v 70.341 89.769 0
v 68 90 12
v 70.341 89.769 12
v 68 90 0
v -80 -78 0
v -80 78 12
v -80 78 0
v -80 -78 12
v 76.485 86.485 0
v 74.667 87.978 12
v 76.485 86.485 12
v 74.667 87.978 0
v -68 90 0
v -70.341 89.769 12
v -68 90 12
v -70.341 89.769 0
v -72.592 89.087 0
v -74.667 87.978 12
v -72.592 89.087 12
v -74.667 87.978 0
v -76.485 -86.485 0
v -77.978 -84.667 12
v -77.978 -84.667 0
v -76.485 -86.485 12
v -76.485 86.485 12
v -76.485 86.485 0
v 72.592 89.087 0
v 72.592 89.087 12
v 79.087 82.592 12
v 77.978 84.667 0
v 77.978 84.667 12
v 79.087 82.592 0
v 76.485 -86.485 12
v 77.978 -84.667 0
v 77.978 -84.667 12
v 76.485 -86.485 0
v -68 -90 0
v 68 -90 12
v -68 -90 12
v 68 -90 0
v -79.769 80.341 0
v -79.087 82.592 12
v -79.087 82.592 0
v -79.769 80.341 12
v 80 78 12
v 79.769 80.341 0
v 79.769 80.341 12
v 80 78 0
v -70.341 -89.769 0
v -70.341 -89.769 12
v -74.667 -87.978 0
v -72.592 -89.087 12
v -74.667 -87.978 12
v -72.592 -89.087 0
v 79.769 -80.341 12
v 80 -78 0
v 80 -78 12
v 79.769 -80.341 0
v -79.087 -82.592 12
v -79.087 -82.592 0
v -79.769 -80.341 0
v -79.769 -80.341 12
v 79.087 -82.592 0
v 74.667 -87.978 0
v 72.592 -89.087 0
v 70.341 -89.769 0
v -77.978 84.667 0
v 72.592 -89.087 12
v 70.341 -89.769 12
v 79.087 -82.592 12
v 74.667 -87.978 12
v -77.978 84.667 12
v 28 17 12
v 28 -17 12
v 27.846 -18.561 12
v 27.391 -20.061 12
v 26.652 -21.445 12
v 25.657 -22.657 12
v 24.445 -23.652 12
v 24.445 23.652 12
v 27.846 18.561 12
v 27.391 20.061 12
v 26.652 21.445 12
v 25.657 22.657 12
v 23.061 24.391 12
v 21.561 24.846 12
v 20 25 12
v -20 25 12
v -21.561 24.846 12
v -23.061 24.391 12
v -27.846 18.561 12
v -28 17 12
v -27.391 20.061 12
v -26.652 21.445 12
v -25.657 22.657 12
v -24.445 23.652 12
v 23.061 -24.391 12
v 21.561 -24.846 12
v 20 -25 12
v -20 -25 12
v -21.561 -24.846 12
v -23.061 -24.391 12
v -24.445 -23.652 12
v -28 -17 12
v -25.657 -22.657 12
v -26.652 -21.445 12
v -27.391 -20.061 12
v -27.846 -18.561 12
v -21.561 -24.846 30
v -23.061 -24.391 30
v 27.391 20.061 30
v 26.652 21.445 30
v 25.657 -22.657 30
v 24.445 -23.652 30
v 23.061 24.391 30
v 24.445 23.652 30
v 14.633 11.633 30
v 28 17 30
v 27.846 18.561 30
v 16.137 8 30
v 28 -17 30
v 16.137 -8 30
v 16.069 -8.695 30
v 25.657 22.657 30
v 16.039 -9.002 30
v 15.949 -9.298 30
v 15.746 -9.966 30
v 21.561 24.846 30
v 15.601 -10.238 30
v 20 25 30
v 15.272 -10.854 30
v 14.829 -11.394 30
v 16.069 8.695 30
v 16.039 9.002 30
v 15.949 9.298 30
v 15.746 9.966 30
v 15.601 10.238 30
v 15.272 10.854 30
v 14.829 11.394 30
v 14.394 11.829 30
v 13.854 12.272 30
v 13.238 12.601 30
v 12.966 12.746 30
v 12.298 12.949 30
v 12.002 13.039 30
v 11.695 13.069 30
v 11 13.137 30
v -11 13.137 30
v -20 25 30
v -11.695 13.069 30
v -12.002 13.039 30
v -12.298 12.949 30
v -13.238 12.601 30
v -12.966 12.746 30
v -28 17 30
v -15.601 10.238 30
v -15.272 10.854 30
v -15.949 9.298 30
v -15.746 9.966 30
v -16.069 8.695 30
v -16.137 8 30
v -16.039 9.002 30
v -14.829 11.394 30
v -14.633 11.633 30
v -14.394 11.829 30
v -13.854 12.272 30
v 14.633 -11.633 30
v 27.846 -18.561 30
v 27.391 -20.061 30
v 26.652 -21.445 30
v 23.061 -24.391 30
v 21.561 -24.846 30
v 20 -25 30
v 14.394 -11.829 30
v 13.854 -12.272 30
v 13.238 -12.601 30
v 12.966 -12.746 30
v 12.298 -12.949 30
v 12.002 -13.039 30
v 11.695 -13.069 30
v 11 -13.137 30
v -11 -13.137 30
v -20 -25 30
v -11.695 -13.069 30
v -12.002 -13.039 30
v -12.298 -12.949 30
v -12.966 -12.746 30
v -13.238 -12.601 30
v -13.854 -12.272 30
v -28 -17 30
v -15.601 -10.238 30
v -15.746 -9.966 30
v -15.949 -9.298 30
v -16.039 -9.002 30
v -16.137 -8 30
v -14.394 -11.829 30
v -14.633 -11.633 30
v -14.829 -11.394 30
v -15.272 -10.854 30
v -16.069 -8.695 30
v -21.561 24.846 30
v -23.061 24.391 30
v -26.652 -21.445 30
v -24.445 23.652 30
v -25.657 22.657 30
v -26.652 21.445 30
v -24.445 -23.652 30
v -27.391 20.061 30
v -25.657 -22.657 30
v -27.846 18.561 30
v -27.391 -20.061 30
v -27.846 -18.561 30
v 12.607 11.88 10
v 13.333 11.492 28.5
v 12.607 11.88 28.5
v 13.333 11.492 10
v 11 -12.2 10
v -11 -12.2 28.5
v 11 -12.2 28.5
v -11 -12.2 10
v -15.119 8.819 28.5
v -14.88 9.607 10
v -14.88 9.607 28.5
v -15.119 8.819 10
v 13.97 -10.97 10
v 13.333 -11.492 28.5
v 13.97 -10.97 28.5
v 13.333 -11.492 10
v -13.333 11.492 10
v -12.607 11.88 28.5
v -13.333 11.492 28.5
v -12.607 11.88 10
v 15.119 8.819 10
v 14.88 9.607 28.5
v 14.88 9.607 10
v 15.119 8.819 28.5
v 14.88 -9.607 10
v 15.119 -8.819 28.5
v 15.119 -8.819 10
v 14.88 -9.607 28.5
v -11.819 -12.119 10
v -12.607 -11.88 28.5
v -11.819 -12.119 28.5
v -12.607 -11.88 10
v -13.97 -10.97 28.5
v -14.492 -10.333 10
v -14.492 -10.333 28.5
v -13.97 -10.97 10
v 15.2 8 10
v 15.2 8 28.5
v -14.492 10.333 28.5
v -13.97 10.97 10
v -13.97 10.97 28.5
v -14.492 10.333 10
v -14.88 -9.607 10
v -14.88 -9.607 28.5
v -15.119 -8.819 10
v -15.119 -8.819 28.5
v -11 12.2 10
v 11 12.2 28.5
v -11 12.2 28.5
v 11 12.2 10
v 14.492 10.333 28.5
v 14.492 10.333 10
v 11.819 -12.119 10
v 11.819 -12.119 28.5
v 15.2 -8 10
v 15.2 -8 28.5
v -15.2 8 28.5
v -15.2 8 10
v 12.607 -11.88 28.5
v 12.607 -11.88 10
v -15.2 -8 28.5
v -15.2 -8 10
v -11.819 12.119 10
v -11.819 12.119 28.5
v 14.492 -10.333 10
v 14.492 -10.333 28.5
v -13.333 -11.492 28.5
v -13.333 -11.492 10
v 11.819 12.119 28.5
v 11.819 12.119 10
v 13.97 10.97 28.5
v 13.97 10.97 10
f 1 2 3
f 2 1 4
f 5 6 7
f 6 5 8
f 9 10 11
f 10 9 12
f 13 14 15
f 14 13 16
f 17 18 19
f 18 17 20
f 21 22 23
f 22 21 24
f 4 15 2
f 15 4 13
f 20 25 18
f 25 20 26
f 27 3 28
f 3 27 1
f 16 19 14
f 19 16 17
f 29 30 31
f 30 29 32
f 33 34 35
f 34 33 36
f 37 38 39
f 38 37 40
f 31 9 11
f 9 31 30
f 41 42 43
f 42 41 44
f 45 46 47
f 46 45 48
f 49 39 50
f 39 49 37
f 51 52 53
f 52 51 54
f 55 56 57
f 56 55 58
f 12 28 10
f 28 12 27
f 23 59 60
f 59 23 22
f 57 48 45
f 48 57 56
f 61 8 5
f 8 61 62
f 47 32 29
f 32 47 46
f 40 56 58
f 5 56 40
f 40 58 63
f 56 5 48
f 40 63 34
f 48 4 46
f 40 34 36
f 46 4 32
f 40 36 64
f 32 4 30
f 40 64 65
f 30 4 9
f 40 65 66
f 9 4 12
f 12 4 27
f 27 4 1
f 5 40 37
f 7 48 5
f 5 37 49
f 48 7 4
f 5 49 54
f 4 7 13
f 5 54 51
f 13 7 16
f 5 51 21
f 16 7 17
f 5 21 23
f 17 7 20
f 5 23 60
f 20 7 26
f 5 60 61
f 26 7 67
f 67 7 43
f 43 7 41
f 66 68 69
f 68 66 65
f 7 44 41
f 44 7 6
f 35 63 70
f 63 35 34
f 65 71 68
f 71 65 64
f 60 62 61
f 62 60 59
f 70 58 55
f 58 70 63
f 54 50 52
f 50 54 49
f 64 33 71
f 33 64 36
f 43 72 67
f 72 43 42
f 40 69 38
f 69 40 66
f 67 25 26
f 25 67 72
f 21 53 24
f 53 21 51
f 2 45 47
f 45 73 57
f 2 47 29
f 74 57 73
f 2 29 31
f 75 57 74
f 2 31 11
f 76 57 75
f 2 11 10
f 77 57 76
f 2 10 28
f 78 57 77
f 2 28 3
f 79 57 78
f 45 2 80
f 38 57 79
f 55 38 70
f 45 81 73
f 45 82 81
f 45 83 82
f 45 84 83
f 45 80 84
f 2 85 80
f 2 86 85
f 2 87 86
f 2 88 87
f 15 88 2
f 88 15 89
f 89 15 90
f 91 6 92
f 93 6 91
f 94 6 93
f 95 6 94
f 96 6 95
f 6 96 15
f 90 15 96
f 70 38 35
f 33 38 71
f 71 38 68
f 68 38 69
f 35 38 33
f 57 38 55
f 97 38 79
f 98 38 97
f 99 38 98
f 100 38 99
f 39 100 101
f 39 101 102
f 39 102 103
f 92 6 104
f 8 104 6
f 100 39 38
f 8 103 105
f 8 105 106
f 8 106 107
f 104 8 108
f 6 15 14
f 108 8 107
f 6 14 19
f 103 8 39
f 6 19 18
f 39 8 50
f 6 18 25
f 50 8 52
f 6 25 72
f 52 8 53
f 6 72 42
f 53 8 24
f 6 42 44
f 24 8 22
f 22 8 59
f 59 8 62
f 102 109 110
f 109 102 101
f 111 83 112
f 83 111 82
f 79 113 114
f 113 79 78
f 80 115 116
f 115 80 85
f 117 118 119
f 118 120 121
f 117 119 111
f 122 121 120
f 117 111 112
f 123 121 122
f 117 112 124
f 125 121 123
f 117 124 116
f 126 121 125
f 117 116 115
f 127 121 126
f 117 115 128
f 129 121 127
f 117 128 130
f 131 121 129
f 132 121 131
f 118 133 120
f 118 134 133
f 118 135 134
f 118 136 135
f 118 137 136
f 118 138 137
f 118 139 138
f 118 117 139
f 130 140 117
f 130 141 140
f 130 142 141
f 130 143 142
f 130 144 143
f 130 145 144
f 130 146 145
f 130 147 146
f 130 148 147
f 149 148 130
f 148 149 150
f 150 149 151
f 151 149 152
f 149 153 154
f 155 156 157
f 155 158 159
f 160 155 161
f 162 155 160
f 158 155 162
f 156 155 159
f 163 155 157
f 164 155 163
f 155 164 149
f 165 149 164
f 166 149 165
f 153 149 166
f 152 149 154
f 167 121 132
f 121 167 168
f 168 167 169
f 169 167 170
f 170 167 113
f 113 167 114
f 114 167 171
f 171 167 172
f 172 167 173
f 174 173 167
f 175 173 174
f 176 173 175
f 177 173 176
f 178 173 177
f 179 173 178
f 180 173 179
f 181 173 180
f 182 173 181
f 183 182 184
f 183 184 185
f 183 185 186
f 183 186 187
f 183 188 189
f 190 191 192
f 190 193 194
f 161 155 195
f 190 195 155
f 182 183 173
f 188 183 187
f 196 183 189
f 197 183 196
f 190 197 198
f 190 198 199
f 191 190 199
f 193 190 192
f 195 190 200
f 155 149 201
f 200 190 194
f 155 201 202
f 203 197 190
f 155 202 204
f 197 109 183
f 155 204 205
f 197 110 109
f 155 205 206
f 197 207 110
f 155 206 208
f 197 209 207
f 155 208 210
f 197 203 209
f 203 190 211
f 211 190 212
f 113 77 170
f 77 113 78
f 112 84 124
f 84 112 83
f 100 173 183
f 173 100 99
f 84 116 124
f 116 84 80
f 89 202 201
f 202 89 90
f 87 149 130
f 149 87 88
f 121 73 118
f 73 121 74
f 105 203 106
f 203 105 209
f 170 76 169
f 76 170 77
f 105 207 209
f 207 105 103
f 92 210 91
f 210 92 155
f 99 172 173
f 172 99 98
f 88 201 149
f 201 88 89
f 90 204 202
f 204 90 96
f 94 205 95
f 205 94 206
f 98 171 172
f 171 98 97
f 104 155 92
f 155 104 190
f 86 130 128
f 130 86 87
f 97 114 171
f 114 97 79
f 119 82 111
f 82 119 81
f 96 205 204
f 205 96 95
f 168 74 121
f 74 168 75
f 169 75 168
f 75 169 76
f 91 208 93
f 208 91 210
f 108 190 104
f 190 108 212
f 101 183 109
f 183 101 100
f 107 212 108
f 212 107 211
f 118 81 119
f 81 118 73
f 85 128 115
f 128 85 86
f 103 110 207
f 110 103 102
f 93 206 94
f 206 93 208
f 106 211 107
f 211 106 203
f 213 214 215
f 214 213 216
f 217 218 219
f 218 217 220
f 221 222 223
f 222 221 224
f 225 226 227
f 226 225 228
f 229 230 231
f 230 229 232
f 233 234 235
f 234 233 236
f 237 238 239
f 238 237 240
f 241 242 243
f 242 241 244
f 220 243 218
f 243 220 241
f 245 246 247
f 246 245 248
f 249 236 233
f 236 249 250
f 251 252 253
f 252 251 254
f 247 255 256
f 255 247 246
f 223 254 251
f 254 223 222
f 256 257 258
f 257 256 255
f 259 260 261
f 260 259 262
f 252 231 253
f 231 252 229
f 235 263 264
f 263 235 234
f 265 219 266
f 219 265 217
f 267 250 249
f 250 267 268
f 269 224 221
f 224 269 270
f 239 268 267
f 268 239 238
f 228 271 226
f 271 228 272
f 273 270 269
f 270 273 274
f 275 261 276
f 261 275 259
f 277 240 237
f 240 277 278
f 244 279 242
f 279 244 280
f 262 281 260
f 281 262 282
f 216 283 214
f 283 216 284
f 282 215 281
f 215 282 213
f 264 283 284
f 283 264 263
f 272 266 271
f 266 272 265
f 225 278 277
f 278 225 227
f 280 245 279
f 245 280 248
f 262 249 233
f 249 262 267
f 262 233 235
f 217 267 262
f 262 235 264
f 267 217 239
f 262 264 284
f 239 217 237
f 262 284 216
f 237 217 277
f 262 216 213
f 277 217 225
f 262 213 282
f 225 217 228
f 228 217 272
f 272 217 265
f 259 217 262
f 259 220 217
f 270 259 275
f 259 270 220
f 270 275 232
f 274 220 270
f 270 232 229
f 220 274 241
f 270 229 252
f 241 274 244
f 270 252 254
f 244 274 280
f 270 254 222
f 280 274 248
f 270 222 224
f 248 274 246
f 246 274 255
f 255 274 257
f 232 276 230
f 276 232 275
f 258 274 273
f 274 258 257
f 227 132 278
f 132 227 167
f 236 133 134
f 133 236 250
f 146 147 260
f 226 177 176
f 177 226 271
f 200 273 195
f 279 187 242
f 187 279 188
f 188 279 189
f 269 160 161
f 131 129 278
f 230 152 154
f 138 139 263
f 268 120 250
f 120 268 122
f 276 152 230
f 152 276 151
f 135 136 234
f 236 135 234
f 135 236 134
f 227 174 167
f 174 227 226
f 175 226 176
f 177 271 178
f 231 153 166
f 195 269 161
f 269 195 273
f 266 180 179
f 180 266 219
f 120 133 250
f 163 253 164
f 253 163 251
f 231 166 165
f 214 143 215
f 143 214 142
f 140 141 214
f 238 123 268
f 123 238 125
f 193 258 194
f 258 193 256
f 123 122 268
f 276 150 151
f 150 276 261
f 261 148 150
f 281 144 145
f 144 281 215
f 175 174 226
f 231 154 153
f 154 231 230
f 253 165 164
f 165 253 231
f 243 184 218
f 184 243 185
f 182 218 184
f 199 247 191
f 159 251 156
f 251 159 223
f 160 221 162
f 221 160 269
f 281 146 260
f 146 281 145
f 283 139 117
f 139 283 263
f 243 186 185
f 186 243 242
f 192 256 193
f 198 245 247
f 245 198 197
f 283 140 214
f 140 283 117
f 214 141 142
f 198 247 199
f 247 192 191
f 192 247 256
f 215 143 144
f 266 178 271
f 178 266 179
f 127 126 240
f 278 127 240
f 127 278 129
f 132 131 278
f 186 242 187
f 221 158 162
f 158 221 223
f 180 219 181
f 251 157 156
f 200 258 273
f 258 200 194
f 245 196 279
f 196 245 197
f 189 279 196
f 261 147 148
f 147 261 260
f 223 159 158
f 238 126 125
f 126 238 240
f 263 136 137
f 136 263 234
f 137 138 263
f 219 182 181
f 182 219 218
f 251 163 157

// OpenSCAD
// Headphone stand in three parts - PLA, no supports, 0.4mm nozzle
// Print orientations (+Z up, bottom on bed):
//   base   : flat, plate bottom on bed
//   post   : vertical, bottom on bed (250+ tall)
//   hanger : flat bottom on bed, curved top up, socket opening down (bridged)
// Assembly (desk Z=0): base 0-30, post 10-262, hanger 244-270 (top ~270)

part = "base"; // [base:Base, post:Post, hanger:Hanger, assembly:Assembly]
cadverify_only = "";
module instance(name, part, unit = 1) {
    echo(cadverify_instance = [name, part, unit]);
    if (cadverify_only == "" || cadverify_only == name) children();
}

// ---------- parameters ----------
baseW = 160; baseD = 180; baseT = 12; baseR = 12;
bossW = 56; bossD = 50; bossH = 18; bossR = 8;
bossTop = baseT + bossH; // 30
sockW = 30.4; sockD = 24.4; sockR = 4.2; // base socket (post 30x24 +0.4)
sockDepthBase = 20;
sockFloorBase = bossTop - sockDepthBase; // 10
flare = 1.5;
mouthWBase = sockW + 2*flare; mouthDBase = sockD + 2*flare; mouthRBase = sockR + flare;

postW = 30; postD = 24; postR = 4; postH = 252; postCham = 1.5;
tipW = postW - 2*postCham; tipD = postD - 2*postCham; tipR = 2.5;

hangW = 42; hangL = 120; hangZc = 26; hangZe = 14; hangFillet = 8; hangPlanR = 15;
hangSockW = 30.4; hangSockD = 24.4; hangSockR = 4.2; hangSockDepth = 18;
mouthWH = hangSockW + 2*flare; mouthDH = hangSockD + 2*flare; mouthRH = hangSockR + flare;

postZ = 10;          // post bottom in assembly
hangerZ = 244;       // hanger bottom in assembly -> top 270
// post top = postZ+postH = 262 = hangerZ+hangSockDepth (socket floor)

// ---------- helpers ----------
module rounded_box(W,D,H,R) {
    // centered in XY, bottom at Z=0
    if (R <= 0.01) {
        translate([-W/2,-D/2,0]) cube([W,D,H]);
    } else {
        hull() {
            for (sx=[-1,1], sy=[-1,1])
                translate([sx*(W/2-R), sy*(D/2-R), 0])
                    cylinder(r=R, h=H, $fn=32);
        }
    }
}
module rect_frustum(W1,D1,R1, W2,D2,R2, H) {
    // bottom size 1 at Z=0, top size 2 at Z=H
    hull() {
        translate([0,0,0]) rounded_box(W1,D1,0.1,R1);
        translate([0,0,H-0.1]) rounded_box(W2,D2,0.1,R2);
    }
}

// ---------- parts (print orientation, bottom Z=0, centered XY) ----------
module base_part() {
    difference() {
        union() {
            rounded_box(baseW, baseD, baseT, baseR);
            translate([0,0,baseT-0.2]) rounded_box(bossW, bossD, bossH+0.2, bossR);
        }
        // socket bore (extend above mouth for clean cut)
        translate([0,0,sockFloorBase]) rounded_box(sockW, sockD, sockDepthBase+1.0, sockR);
        // entry flare 45deg (mouth larger at top)
        translate([0,0,bossTop-flare])
            rect_frustum(sockW,sockD,sockR, mouthWBase,mouthDBase,mouthRBase, flare+1.0);
    }
}

module post_part() {
    // single hull of nested rounded-rect slices: no internal ledges,
    // straight sides, 45° lead-in chamfers at both ends
    hull() {
        translate([0,0,0]) rounded_box(tipW, tipD, 0.2, tipR);
        translate([0,0,postCham-0.15]) rounded_box(postW, postD, 0.3, postR);
        translate([0,0,postH-postCham-0.15]) rounded_box(postW, postD, 0.3, postR);
        translate([0,0,postH-0.2]) rounded_box(tipW, tipD, 0.2, tipR);
    }
}

module hanger_A() {
    union() {
        // lower block 0 .. Zc-r
        translate([-hangW/2, -hangL/2, 0]) cube([hangW, hangL, hangZc-hangFillet]);
        // upper block (narrower) Zc-r .. top
        translate([-(hangW-2*hangFillet)/2, -hangL/2, hangZc-hangFillet])
            cube([hangW-2*hangFillet, hangL, hangFillet]);
        // two side fillet cylinders along Y
        for (sx=[-1,1])
            translate([sx*(hangW/2-hangFillet), -hangL/2, hangZc-hangFillet])
                rotate([-90,0,0])
                    cylinder(r=hangFillet, h=hangL, $fn=32);
    }
}
module hanger_B() {
    // hull of slices under parabolic top (convex hypograph)
    N = 25;
    hull() {
        for (i=[0:N-1]) {
            yi = -hangL/2 + hangL*i/(N-1);
            hi = hangZc - (hangZc-hangZe)*pow(2*yi/hangL,2);
            translate([-hangW/2, yi-0.3, 0]) cube([hangW, 0.6, hi]);
        }
    }
}
module hanger_D() {
    rounded_box(hangW, hangL, 30, hangPlanR);
}
module hanger_part() {
    difference() {
        intersection() {
            hanger_A();
            hanger_B();
            hanger_D();
        }
        // socket bore (extend below bed for clean cut)
        translate([0,0,-0.5]) rounded_box(hangSockW, hangSockD, hangSockDepth+0.5, hangSockR);
        // entry flare at mouth (bottom)
        translate([0,0,-0.5])
            rect_frustum(mouthWH,mouthDH,mouthRH, hangSockW,hangSockD,hangSockR, flare+0.5);
    }
}

// ---------- specs ----------
if (part == "base") {
    echo(cadverify_spec = [
        ["bounds", [[-baseW/2, -baseD/2, 0], [baseW/2, baseD/2, bossTop]]],
        ["bodies", 1],
        ["through_holes", 0],
        ["support_faces", [["bed", "-z", 20000]]],
        ["overhangs_allowed", []],
        ["copies", 1],
        ["details", [
            ["plate", "material", [[-baseW/2, -baseD/2, 0], [baseW/2, baseD/2, baseT]], 0.95],
            ["boss", "material", [[-bossW/2, -bossD/2, baseT], [bossW/2, bossD/2, bossTop]], 0.60],
            ["socket", "void", [[-sockW/2, -sockD/2, sockFloorBase], [sockW/2, sockD/2, bossTop]], 0.90],
            ["floor", "thickness", [0, 0, -5], [0, 0, 1], 10],
            ["corner", "view", [[65, 75, 0], [80, 90, 12]]],
            ["mouth", "view", [[-17, -14, 28], [17, 14, 30]]]
        ]]
    ]);
    base_part();
} else if (part == "post") {
    echo(cadverify_spec = [
        ["bounds", [[-postW/2, -postD/2, 0], [postW/2, postD/2, postH]]],
        ["bodies", 1],
        ["through_holes", 0],
        ["support_faces", [["bed", "-z", 400]]],
        ["overhangs_allowed", [["lead-in chamfer at 45deg, prints support-free", [[-16, -13, 0], [16, 13, 2]]]]],
        ["copies", 1],
        ["details", [
            ["shaft", "material", [[-9.5, -9.5, 10], [9.5, 9.5, 242]], 0.99],
            ["wall", "thickness", [30, 0, 126], [-1, 0, 0], 30],
            ["lead", "view", [[-15, -12, 0], [15, 12, 3]]],
            ["topcham", "view", [[-15, -12, 249], [15, 12, 252]]]
        ]]
    ]);
    post_part();
} else if (part == "hanger") {
    echo(cadverify_spec = [
        ["bounds", [[-hangW/2, -hangL/2, 0], [hangW/2, hangL/2, hangZc]]],
        ["bodies", 1],
        ["through_holes", 0],
        ["support_faces", [["bed", "-z", 2500]]],
        ["overhangs_allowed", [["bridging socket ceiling", [[-hangSockW/2, -hangSockD/2, 16], [hangSockW/2, hangSockD/2, 20]]]]],
        ["copies", 1],
        ["details", [
            ["contact", "material", [[-15, -30, 18], [15, 30, 22]], 0.95],
            ["socket", "void", [[-hangSockW/2, -hangSockD/2, 0], [hangSockW/2, hangSockD/2, hangSockDepth]], 0.90],
            ["topwall", "thickness", [0, 0, 30], [0, 0, -1], 8],
            ["fillet", "view", [[13, -20, 18], [21, 20, 26]]],
            ["arch", "view", [[-21, -60, 12], [21, -40, 16]]],
            ["mouth", "view", [[-17, -14, 0], [17, 14, 2]]]
        ]]
    ]);
    hanger_part();
} else if (part == "assembly") {
    echo(cadverify_spec = [
        ["bounds", [[-baseW/2, -baseD/2, 0], [baseW/2, baseD/2, hangerZ+hangZc]]],
        ["support_faces", [["desk", "-z", 20000]]],
        ["allowed_interferences", []],
        ["motions", []],
        ["assembly_order", [
            [["base_1"], [0, 0, 0]],
            [["post_1"], [0, 0, -1]],
            [["hanger_1"], [0, 0, -1]]
        ]]
    ]);
    instance("base_1", "base") translate([0,0,0]) base_part();
    instance("post_1", "post") translate([0,0,postZ]) post_part();
    instance("hanger_1", "hanger") translate([0,0,hangerZ]) hanger_part();
}
